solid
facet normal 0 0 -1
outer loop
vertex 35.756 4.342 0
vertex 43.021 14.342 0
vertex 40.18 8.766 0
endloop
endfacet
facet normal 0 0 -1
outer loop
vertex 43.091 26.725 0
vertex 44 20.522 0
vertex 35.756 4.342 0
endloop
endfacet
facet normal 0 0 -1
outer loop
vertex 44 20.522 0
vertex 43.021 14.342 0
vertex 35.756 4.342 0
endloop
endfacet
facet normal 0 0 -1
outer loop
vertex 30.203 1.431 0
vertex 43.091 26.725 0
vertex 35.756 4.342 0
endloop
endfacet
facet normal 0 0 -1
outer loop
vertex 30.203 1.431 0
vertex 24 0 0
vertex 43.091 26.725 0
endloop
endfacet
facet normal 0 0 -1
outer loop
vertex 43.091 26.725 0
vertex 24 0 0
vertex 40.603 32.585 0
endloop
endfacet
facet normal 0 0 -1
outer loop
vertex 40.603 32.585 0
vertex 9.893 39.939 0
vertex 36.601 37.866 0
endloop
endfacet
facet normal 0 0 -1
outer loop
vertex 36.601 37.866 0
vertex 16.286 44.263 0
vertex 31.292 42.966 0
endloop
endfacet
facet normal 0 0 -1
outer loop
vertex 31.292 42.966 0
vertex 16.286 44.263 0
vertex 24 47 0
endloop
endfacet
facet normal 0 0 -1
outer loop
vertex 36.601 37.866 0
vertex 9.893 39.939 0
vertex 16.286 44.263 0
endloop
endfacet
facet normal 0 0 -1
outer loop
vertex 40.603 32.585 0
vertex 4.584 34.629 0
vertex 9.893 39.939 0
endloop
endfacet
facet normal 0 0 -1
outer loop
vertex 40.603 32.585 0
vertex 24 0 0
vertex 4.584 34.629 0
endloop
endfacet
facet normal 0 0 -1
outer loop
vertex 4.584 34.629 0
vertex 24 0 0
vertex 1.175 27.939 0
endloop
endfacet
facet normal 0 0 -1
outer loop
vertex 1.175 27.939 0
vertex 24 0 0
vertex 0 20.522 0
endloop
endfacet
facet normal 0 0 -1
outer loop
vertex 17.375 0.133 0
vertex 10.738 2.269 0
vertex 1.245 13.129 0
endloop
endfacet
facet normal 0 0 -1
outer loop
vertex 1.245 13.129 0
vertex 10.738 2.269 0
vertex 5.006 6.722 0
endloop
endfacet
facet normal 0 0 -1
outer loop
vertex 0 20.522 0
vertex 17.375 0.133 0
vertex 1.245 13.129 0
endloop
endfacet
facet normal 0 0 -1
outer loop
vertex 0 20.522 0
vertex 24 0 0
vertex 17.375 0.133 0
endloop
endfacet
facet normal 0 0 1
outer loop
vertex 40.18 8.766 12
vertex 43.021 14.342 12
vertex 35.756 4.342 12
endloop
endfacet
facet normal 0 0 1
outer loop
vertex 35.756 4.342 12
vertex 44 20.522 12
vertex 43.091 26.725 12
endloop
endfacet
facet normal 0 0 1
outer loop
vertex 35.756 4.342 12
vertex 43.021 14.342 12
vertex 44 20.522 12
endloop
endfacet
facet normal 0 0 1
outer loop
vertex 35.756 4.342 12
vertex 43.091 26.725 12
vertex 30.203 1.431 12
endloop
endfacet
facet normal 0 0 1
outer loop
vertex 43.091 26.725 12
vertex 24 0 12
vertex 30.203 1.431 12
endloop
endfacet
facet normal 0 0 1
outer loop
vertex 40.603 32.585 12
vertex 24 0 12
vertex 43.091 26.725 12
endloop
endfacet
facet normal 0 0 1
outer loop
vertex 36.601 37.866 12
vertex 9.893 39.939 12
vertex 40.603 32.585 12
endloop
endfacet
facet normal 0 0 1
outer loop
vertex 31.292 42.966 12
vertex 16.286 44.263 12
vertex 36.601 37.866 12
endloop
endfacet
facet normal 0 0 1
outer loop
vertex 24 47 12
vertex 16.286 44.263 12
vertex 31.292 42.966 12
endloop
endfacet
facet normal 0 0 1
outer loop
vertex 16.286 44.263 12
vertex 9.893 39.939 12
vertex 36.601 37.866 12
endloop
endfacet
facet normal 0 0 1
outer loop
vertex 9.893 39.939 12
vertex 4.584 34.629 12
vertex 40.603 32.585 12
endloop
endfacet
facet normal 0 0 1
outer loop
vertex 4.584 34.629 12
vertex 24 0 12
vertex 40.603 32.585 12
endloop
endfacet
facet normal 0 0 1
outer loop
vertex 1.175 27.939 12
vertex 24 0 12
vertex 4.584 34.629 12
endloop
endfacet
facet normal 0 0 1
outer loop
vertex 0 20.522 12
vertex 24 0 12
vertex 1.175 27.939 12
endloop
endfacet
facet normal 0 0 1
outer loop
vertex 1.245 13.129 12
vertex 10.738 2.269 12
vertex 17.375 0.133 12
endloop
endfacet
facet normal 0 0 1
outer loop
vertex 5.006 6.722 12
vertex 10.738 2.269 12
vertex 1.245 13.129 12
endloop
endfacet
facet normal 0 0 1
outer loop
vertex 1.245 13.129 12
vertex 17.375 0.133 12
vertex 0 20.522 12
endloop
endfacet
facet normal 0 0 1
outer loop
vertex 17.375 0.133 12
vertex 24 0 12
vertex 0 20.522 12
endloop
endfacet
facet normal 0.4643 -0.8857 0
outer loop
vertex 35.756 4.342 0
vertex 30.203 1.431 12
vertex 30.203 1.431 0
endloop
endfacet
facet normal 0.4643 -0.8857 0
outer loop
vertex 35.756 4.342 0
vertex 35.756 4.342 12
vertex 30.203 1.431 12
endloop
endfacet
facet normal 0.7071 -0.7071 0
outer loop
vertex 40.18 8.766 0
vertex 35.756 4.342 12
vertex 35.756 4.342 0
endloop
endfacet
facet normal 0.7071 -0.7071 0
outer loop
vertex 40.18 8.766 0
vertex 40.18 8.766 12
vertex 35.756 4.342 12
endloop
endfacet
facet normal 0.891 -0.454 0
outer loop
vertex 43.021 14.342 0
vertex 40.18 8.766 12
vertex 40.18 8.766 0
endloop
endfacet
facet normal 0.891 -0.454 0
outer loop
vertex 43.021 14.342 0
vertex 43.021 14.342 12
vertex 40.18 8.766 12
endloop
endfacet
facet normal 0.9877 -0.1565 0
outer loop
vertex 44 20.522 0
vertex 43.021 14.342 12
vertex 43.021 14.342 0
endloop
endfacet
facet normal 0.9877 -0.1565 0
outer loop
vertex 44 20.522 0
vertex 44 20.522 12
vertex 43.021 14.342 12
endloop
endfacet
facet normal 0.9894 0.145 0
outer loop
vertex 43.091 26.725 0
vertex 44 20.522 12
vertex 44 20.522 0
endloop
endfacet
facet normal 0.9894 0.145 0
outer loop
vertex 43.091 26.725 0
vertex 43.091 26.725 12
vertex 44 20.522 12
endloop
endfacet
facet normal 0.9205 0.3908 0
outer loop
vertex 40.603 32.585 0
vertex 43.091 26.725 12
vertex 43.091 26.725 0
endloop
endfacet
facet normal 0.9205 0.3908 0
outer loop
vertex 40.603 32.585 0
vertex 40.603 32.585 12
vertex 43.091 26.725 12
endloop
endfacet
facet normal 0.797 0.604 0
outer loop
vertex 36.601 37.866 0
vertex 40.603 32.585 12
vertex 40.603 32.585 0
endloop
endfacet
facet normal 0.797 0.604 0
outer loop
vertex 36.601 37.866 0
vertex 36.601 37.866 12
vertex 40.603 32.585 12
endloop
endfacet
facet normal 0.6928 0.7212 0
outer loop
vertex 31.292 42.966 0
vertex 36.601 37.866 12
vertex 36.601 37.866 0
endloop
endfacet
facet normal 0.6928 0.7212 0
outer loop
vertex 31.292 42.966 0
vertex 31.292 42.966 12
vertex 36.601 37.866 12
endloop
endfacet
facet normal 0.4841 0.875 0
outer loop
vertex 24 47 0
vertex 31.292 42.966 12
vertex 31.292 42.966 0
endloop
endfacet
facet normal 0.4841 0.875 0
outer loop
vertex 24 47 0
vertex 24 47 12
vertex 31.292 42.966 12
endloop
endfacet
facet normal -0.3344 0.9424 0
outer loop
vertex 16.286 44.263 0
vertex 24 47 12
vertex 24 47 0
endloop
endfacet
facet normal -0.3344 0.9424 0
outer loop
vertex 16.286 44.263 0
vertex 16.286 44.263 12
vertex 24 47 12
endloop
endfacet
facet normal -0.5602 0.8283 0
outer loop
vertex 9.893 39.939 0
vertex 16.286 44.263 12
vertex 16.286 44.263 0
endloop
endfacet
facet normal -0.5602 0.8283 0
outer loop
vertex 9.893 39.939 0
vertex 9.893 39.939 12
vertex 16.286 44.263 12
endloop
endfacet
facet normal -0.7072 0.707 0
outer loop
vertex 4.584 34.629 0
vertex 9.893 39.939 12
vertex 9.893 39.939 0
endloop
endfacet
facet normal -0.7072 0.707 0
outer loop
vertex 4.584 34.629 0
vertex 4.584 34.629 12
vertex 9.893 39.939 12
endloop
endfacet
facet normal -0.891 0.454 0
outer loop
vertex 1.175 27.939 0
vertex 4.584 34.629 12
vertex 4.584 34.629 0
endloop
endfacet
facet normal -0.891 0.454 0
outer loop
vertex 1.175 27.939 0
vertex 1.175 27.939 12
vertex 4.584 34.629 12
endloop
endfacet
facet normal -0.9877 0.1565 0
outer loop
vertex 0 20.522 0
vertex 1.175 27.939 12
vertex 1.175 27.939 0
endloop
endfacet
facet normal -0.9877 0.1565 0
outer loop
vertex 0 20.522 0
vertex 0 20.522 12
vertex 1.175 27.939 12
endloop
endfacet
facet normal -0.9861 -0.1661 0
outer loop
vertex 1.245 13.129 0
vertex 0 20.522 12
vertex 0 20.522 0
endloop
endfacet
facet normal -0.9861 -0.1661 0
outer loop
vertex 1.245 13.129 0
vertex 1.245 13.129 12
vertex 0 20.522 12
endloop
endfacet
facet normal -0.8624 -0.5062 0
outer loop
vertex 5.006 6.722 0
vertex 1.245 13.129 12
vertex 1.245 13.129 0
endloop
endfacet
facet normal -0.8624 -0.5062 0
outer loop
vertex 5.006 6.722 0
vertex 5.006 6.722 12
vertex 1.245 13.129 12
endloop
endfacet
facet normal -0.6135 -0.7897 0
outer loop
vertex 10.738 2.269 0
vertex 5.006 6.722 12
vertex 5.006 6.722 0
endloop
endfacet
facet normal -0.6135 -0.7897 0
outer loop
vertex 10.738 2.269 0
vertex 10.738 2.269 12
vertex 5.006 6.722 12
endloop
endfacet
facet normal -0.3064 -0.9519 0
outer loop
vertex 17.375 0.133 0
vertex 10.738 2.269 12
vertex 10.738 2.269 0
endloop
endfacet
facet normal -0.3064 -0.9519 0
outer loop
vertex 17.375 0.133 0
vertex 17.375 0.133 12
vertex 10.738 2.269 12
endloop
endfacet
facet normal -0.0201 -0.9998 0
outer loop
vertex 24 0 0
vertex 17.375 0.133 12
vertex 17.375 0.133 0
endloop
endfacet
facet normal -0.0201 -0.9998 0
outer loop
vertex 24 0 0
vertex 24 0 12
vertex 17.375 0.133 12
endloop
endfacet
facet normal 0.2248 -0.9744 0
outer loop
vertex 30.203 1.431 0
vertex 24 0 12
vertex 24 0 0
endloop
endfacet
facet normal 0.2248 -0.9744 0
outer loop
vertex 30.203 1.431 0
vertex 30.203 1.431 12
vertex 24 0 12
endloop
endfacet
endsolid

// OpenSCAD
$fn = 32;

// ----------------------------------------------------------------------
// Cam disc: base radius 20.0 mm, lift 4.0 mm, 20 profile points
// ----------------------------------------------------------------------

// --- parameters (mm) ---
profile_height = 12;      // extrusion height
profile_points = 20;      // points of the closed outline

profile = [[44, 20.522], [43.091, 26.725], [40.603, 32.585], [36.601, 37.866], [31.292, 42.966], [24, 47], [16.286, 44.263], [9.893, 39.939], [4.584, 34.629], [1.175, 27.939], [0, 20.522], [1.245, 13.129], [5.006, 6.722], [10.738, 2.269], [17.375, 0.133], [24, 0], [30.203, 1.431], [35.756, 4.342], [40.18, 8.766], [43.021, 14.342]];  // single closed polygon, 20 points, counter clockwise

// --- the one profile operation ---
linear_extrude(height = profile_height) polygon(points = profile);
